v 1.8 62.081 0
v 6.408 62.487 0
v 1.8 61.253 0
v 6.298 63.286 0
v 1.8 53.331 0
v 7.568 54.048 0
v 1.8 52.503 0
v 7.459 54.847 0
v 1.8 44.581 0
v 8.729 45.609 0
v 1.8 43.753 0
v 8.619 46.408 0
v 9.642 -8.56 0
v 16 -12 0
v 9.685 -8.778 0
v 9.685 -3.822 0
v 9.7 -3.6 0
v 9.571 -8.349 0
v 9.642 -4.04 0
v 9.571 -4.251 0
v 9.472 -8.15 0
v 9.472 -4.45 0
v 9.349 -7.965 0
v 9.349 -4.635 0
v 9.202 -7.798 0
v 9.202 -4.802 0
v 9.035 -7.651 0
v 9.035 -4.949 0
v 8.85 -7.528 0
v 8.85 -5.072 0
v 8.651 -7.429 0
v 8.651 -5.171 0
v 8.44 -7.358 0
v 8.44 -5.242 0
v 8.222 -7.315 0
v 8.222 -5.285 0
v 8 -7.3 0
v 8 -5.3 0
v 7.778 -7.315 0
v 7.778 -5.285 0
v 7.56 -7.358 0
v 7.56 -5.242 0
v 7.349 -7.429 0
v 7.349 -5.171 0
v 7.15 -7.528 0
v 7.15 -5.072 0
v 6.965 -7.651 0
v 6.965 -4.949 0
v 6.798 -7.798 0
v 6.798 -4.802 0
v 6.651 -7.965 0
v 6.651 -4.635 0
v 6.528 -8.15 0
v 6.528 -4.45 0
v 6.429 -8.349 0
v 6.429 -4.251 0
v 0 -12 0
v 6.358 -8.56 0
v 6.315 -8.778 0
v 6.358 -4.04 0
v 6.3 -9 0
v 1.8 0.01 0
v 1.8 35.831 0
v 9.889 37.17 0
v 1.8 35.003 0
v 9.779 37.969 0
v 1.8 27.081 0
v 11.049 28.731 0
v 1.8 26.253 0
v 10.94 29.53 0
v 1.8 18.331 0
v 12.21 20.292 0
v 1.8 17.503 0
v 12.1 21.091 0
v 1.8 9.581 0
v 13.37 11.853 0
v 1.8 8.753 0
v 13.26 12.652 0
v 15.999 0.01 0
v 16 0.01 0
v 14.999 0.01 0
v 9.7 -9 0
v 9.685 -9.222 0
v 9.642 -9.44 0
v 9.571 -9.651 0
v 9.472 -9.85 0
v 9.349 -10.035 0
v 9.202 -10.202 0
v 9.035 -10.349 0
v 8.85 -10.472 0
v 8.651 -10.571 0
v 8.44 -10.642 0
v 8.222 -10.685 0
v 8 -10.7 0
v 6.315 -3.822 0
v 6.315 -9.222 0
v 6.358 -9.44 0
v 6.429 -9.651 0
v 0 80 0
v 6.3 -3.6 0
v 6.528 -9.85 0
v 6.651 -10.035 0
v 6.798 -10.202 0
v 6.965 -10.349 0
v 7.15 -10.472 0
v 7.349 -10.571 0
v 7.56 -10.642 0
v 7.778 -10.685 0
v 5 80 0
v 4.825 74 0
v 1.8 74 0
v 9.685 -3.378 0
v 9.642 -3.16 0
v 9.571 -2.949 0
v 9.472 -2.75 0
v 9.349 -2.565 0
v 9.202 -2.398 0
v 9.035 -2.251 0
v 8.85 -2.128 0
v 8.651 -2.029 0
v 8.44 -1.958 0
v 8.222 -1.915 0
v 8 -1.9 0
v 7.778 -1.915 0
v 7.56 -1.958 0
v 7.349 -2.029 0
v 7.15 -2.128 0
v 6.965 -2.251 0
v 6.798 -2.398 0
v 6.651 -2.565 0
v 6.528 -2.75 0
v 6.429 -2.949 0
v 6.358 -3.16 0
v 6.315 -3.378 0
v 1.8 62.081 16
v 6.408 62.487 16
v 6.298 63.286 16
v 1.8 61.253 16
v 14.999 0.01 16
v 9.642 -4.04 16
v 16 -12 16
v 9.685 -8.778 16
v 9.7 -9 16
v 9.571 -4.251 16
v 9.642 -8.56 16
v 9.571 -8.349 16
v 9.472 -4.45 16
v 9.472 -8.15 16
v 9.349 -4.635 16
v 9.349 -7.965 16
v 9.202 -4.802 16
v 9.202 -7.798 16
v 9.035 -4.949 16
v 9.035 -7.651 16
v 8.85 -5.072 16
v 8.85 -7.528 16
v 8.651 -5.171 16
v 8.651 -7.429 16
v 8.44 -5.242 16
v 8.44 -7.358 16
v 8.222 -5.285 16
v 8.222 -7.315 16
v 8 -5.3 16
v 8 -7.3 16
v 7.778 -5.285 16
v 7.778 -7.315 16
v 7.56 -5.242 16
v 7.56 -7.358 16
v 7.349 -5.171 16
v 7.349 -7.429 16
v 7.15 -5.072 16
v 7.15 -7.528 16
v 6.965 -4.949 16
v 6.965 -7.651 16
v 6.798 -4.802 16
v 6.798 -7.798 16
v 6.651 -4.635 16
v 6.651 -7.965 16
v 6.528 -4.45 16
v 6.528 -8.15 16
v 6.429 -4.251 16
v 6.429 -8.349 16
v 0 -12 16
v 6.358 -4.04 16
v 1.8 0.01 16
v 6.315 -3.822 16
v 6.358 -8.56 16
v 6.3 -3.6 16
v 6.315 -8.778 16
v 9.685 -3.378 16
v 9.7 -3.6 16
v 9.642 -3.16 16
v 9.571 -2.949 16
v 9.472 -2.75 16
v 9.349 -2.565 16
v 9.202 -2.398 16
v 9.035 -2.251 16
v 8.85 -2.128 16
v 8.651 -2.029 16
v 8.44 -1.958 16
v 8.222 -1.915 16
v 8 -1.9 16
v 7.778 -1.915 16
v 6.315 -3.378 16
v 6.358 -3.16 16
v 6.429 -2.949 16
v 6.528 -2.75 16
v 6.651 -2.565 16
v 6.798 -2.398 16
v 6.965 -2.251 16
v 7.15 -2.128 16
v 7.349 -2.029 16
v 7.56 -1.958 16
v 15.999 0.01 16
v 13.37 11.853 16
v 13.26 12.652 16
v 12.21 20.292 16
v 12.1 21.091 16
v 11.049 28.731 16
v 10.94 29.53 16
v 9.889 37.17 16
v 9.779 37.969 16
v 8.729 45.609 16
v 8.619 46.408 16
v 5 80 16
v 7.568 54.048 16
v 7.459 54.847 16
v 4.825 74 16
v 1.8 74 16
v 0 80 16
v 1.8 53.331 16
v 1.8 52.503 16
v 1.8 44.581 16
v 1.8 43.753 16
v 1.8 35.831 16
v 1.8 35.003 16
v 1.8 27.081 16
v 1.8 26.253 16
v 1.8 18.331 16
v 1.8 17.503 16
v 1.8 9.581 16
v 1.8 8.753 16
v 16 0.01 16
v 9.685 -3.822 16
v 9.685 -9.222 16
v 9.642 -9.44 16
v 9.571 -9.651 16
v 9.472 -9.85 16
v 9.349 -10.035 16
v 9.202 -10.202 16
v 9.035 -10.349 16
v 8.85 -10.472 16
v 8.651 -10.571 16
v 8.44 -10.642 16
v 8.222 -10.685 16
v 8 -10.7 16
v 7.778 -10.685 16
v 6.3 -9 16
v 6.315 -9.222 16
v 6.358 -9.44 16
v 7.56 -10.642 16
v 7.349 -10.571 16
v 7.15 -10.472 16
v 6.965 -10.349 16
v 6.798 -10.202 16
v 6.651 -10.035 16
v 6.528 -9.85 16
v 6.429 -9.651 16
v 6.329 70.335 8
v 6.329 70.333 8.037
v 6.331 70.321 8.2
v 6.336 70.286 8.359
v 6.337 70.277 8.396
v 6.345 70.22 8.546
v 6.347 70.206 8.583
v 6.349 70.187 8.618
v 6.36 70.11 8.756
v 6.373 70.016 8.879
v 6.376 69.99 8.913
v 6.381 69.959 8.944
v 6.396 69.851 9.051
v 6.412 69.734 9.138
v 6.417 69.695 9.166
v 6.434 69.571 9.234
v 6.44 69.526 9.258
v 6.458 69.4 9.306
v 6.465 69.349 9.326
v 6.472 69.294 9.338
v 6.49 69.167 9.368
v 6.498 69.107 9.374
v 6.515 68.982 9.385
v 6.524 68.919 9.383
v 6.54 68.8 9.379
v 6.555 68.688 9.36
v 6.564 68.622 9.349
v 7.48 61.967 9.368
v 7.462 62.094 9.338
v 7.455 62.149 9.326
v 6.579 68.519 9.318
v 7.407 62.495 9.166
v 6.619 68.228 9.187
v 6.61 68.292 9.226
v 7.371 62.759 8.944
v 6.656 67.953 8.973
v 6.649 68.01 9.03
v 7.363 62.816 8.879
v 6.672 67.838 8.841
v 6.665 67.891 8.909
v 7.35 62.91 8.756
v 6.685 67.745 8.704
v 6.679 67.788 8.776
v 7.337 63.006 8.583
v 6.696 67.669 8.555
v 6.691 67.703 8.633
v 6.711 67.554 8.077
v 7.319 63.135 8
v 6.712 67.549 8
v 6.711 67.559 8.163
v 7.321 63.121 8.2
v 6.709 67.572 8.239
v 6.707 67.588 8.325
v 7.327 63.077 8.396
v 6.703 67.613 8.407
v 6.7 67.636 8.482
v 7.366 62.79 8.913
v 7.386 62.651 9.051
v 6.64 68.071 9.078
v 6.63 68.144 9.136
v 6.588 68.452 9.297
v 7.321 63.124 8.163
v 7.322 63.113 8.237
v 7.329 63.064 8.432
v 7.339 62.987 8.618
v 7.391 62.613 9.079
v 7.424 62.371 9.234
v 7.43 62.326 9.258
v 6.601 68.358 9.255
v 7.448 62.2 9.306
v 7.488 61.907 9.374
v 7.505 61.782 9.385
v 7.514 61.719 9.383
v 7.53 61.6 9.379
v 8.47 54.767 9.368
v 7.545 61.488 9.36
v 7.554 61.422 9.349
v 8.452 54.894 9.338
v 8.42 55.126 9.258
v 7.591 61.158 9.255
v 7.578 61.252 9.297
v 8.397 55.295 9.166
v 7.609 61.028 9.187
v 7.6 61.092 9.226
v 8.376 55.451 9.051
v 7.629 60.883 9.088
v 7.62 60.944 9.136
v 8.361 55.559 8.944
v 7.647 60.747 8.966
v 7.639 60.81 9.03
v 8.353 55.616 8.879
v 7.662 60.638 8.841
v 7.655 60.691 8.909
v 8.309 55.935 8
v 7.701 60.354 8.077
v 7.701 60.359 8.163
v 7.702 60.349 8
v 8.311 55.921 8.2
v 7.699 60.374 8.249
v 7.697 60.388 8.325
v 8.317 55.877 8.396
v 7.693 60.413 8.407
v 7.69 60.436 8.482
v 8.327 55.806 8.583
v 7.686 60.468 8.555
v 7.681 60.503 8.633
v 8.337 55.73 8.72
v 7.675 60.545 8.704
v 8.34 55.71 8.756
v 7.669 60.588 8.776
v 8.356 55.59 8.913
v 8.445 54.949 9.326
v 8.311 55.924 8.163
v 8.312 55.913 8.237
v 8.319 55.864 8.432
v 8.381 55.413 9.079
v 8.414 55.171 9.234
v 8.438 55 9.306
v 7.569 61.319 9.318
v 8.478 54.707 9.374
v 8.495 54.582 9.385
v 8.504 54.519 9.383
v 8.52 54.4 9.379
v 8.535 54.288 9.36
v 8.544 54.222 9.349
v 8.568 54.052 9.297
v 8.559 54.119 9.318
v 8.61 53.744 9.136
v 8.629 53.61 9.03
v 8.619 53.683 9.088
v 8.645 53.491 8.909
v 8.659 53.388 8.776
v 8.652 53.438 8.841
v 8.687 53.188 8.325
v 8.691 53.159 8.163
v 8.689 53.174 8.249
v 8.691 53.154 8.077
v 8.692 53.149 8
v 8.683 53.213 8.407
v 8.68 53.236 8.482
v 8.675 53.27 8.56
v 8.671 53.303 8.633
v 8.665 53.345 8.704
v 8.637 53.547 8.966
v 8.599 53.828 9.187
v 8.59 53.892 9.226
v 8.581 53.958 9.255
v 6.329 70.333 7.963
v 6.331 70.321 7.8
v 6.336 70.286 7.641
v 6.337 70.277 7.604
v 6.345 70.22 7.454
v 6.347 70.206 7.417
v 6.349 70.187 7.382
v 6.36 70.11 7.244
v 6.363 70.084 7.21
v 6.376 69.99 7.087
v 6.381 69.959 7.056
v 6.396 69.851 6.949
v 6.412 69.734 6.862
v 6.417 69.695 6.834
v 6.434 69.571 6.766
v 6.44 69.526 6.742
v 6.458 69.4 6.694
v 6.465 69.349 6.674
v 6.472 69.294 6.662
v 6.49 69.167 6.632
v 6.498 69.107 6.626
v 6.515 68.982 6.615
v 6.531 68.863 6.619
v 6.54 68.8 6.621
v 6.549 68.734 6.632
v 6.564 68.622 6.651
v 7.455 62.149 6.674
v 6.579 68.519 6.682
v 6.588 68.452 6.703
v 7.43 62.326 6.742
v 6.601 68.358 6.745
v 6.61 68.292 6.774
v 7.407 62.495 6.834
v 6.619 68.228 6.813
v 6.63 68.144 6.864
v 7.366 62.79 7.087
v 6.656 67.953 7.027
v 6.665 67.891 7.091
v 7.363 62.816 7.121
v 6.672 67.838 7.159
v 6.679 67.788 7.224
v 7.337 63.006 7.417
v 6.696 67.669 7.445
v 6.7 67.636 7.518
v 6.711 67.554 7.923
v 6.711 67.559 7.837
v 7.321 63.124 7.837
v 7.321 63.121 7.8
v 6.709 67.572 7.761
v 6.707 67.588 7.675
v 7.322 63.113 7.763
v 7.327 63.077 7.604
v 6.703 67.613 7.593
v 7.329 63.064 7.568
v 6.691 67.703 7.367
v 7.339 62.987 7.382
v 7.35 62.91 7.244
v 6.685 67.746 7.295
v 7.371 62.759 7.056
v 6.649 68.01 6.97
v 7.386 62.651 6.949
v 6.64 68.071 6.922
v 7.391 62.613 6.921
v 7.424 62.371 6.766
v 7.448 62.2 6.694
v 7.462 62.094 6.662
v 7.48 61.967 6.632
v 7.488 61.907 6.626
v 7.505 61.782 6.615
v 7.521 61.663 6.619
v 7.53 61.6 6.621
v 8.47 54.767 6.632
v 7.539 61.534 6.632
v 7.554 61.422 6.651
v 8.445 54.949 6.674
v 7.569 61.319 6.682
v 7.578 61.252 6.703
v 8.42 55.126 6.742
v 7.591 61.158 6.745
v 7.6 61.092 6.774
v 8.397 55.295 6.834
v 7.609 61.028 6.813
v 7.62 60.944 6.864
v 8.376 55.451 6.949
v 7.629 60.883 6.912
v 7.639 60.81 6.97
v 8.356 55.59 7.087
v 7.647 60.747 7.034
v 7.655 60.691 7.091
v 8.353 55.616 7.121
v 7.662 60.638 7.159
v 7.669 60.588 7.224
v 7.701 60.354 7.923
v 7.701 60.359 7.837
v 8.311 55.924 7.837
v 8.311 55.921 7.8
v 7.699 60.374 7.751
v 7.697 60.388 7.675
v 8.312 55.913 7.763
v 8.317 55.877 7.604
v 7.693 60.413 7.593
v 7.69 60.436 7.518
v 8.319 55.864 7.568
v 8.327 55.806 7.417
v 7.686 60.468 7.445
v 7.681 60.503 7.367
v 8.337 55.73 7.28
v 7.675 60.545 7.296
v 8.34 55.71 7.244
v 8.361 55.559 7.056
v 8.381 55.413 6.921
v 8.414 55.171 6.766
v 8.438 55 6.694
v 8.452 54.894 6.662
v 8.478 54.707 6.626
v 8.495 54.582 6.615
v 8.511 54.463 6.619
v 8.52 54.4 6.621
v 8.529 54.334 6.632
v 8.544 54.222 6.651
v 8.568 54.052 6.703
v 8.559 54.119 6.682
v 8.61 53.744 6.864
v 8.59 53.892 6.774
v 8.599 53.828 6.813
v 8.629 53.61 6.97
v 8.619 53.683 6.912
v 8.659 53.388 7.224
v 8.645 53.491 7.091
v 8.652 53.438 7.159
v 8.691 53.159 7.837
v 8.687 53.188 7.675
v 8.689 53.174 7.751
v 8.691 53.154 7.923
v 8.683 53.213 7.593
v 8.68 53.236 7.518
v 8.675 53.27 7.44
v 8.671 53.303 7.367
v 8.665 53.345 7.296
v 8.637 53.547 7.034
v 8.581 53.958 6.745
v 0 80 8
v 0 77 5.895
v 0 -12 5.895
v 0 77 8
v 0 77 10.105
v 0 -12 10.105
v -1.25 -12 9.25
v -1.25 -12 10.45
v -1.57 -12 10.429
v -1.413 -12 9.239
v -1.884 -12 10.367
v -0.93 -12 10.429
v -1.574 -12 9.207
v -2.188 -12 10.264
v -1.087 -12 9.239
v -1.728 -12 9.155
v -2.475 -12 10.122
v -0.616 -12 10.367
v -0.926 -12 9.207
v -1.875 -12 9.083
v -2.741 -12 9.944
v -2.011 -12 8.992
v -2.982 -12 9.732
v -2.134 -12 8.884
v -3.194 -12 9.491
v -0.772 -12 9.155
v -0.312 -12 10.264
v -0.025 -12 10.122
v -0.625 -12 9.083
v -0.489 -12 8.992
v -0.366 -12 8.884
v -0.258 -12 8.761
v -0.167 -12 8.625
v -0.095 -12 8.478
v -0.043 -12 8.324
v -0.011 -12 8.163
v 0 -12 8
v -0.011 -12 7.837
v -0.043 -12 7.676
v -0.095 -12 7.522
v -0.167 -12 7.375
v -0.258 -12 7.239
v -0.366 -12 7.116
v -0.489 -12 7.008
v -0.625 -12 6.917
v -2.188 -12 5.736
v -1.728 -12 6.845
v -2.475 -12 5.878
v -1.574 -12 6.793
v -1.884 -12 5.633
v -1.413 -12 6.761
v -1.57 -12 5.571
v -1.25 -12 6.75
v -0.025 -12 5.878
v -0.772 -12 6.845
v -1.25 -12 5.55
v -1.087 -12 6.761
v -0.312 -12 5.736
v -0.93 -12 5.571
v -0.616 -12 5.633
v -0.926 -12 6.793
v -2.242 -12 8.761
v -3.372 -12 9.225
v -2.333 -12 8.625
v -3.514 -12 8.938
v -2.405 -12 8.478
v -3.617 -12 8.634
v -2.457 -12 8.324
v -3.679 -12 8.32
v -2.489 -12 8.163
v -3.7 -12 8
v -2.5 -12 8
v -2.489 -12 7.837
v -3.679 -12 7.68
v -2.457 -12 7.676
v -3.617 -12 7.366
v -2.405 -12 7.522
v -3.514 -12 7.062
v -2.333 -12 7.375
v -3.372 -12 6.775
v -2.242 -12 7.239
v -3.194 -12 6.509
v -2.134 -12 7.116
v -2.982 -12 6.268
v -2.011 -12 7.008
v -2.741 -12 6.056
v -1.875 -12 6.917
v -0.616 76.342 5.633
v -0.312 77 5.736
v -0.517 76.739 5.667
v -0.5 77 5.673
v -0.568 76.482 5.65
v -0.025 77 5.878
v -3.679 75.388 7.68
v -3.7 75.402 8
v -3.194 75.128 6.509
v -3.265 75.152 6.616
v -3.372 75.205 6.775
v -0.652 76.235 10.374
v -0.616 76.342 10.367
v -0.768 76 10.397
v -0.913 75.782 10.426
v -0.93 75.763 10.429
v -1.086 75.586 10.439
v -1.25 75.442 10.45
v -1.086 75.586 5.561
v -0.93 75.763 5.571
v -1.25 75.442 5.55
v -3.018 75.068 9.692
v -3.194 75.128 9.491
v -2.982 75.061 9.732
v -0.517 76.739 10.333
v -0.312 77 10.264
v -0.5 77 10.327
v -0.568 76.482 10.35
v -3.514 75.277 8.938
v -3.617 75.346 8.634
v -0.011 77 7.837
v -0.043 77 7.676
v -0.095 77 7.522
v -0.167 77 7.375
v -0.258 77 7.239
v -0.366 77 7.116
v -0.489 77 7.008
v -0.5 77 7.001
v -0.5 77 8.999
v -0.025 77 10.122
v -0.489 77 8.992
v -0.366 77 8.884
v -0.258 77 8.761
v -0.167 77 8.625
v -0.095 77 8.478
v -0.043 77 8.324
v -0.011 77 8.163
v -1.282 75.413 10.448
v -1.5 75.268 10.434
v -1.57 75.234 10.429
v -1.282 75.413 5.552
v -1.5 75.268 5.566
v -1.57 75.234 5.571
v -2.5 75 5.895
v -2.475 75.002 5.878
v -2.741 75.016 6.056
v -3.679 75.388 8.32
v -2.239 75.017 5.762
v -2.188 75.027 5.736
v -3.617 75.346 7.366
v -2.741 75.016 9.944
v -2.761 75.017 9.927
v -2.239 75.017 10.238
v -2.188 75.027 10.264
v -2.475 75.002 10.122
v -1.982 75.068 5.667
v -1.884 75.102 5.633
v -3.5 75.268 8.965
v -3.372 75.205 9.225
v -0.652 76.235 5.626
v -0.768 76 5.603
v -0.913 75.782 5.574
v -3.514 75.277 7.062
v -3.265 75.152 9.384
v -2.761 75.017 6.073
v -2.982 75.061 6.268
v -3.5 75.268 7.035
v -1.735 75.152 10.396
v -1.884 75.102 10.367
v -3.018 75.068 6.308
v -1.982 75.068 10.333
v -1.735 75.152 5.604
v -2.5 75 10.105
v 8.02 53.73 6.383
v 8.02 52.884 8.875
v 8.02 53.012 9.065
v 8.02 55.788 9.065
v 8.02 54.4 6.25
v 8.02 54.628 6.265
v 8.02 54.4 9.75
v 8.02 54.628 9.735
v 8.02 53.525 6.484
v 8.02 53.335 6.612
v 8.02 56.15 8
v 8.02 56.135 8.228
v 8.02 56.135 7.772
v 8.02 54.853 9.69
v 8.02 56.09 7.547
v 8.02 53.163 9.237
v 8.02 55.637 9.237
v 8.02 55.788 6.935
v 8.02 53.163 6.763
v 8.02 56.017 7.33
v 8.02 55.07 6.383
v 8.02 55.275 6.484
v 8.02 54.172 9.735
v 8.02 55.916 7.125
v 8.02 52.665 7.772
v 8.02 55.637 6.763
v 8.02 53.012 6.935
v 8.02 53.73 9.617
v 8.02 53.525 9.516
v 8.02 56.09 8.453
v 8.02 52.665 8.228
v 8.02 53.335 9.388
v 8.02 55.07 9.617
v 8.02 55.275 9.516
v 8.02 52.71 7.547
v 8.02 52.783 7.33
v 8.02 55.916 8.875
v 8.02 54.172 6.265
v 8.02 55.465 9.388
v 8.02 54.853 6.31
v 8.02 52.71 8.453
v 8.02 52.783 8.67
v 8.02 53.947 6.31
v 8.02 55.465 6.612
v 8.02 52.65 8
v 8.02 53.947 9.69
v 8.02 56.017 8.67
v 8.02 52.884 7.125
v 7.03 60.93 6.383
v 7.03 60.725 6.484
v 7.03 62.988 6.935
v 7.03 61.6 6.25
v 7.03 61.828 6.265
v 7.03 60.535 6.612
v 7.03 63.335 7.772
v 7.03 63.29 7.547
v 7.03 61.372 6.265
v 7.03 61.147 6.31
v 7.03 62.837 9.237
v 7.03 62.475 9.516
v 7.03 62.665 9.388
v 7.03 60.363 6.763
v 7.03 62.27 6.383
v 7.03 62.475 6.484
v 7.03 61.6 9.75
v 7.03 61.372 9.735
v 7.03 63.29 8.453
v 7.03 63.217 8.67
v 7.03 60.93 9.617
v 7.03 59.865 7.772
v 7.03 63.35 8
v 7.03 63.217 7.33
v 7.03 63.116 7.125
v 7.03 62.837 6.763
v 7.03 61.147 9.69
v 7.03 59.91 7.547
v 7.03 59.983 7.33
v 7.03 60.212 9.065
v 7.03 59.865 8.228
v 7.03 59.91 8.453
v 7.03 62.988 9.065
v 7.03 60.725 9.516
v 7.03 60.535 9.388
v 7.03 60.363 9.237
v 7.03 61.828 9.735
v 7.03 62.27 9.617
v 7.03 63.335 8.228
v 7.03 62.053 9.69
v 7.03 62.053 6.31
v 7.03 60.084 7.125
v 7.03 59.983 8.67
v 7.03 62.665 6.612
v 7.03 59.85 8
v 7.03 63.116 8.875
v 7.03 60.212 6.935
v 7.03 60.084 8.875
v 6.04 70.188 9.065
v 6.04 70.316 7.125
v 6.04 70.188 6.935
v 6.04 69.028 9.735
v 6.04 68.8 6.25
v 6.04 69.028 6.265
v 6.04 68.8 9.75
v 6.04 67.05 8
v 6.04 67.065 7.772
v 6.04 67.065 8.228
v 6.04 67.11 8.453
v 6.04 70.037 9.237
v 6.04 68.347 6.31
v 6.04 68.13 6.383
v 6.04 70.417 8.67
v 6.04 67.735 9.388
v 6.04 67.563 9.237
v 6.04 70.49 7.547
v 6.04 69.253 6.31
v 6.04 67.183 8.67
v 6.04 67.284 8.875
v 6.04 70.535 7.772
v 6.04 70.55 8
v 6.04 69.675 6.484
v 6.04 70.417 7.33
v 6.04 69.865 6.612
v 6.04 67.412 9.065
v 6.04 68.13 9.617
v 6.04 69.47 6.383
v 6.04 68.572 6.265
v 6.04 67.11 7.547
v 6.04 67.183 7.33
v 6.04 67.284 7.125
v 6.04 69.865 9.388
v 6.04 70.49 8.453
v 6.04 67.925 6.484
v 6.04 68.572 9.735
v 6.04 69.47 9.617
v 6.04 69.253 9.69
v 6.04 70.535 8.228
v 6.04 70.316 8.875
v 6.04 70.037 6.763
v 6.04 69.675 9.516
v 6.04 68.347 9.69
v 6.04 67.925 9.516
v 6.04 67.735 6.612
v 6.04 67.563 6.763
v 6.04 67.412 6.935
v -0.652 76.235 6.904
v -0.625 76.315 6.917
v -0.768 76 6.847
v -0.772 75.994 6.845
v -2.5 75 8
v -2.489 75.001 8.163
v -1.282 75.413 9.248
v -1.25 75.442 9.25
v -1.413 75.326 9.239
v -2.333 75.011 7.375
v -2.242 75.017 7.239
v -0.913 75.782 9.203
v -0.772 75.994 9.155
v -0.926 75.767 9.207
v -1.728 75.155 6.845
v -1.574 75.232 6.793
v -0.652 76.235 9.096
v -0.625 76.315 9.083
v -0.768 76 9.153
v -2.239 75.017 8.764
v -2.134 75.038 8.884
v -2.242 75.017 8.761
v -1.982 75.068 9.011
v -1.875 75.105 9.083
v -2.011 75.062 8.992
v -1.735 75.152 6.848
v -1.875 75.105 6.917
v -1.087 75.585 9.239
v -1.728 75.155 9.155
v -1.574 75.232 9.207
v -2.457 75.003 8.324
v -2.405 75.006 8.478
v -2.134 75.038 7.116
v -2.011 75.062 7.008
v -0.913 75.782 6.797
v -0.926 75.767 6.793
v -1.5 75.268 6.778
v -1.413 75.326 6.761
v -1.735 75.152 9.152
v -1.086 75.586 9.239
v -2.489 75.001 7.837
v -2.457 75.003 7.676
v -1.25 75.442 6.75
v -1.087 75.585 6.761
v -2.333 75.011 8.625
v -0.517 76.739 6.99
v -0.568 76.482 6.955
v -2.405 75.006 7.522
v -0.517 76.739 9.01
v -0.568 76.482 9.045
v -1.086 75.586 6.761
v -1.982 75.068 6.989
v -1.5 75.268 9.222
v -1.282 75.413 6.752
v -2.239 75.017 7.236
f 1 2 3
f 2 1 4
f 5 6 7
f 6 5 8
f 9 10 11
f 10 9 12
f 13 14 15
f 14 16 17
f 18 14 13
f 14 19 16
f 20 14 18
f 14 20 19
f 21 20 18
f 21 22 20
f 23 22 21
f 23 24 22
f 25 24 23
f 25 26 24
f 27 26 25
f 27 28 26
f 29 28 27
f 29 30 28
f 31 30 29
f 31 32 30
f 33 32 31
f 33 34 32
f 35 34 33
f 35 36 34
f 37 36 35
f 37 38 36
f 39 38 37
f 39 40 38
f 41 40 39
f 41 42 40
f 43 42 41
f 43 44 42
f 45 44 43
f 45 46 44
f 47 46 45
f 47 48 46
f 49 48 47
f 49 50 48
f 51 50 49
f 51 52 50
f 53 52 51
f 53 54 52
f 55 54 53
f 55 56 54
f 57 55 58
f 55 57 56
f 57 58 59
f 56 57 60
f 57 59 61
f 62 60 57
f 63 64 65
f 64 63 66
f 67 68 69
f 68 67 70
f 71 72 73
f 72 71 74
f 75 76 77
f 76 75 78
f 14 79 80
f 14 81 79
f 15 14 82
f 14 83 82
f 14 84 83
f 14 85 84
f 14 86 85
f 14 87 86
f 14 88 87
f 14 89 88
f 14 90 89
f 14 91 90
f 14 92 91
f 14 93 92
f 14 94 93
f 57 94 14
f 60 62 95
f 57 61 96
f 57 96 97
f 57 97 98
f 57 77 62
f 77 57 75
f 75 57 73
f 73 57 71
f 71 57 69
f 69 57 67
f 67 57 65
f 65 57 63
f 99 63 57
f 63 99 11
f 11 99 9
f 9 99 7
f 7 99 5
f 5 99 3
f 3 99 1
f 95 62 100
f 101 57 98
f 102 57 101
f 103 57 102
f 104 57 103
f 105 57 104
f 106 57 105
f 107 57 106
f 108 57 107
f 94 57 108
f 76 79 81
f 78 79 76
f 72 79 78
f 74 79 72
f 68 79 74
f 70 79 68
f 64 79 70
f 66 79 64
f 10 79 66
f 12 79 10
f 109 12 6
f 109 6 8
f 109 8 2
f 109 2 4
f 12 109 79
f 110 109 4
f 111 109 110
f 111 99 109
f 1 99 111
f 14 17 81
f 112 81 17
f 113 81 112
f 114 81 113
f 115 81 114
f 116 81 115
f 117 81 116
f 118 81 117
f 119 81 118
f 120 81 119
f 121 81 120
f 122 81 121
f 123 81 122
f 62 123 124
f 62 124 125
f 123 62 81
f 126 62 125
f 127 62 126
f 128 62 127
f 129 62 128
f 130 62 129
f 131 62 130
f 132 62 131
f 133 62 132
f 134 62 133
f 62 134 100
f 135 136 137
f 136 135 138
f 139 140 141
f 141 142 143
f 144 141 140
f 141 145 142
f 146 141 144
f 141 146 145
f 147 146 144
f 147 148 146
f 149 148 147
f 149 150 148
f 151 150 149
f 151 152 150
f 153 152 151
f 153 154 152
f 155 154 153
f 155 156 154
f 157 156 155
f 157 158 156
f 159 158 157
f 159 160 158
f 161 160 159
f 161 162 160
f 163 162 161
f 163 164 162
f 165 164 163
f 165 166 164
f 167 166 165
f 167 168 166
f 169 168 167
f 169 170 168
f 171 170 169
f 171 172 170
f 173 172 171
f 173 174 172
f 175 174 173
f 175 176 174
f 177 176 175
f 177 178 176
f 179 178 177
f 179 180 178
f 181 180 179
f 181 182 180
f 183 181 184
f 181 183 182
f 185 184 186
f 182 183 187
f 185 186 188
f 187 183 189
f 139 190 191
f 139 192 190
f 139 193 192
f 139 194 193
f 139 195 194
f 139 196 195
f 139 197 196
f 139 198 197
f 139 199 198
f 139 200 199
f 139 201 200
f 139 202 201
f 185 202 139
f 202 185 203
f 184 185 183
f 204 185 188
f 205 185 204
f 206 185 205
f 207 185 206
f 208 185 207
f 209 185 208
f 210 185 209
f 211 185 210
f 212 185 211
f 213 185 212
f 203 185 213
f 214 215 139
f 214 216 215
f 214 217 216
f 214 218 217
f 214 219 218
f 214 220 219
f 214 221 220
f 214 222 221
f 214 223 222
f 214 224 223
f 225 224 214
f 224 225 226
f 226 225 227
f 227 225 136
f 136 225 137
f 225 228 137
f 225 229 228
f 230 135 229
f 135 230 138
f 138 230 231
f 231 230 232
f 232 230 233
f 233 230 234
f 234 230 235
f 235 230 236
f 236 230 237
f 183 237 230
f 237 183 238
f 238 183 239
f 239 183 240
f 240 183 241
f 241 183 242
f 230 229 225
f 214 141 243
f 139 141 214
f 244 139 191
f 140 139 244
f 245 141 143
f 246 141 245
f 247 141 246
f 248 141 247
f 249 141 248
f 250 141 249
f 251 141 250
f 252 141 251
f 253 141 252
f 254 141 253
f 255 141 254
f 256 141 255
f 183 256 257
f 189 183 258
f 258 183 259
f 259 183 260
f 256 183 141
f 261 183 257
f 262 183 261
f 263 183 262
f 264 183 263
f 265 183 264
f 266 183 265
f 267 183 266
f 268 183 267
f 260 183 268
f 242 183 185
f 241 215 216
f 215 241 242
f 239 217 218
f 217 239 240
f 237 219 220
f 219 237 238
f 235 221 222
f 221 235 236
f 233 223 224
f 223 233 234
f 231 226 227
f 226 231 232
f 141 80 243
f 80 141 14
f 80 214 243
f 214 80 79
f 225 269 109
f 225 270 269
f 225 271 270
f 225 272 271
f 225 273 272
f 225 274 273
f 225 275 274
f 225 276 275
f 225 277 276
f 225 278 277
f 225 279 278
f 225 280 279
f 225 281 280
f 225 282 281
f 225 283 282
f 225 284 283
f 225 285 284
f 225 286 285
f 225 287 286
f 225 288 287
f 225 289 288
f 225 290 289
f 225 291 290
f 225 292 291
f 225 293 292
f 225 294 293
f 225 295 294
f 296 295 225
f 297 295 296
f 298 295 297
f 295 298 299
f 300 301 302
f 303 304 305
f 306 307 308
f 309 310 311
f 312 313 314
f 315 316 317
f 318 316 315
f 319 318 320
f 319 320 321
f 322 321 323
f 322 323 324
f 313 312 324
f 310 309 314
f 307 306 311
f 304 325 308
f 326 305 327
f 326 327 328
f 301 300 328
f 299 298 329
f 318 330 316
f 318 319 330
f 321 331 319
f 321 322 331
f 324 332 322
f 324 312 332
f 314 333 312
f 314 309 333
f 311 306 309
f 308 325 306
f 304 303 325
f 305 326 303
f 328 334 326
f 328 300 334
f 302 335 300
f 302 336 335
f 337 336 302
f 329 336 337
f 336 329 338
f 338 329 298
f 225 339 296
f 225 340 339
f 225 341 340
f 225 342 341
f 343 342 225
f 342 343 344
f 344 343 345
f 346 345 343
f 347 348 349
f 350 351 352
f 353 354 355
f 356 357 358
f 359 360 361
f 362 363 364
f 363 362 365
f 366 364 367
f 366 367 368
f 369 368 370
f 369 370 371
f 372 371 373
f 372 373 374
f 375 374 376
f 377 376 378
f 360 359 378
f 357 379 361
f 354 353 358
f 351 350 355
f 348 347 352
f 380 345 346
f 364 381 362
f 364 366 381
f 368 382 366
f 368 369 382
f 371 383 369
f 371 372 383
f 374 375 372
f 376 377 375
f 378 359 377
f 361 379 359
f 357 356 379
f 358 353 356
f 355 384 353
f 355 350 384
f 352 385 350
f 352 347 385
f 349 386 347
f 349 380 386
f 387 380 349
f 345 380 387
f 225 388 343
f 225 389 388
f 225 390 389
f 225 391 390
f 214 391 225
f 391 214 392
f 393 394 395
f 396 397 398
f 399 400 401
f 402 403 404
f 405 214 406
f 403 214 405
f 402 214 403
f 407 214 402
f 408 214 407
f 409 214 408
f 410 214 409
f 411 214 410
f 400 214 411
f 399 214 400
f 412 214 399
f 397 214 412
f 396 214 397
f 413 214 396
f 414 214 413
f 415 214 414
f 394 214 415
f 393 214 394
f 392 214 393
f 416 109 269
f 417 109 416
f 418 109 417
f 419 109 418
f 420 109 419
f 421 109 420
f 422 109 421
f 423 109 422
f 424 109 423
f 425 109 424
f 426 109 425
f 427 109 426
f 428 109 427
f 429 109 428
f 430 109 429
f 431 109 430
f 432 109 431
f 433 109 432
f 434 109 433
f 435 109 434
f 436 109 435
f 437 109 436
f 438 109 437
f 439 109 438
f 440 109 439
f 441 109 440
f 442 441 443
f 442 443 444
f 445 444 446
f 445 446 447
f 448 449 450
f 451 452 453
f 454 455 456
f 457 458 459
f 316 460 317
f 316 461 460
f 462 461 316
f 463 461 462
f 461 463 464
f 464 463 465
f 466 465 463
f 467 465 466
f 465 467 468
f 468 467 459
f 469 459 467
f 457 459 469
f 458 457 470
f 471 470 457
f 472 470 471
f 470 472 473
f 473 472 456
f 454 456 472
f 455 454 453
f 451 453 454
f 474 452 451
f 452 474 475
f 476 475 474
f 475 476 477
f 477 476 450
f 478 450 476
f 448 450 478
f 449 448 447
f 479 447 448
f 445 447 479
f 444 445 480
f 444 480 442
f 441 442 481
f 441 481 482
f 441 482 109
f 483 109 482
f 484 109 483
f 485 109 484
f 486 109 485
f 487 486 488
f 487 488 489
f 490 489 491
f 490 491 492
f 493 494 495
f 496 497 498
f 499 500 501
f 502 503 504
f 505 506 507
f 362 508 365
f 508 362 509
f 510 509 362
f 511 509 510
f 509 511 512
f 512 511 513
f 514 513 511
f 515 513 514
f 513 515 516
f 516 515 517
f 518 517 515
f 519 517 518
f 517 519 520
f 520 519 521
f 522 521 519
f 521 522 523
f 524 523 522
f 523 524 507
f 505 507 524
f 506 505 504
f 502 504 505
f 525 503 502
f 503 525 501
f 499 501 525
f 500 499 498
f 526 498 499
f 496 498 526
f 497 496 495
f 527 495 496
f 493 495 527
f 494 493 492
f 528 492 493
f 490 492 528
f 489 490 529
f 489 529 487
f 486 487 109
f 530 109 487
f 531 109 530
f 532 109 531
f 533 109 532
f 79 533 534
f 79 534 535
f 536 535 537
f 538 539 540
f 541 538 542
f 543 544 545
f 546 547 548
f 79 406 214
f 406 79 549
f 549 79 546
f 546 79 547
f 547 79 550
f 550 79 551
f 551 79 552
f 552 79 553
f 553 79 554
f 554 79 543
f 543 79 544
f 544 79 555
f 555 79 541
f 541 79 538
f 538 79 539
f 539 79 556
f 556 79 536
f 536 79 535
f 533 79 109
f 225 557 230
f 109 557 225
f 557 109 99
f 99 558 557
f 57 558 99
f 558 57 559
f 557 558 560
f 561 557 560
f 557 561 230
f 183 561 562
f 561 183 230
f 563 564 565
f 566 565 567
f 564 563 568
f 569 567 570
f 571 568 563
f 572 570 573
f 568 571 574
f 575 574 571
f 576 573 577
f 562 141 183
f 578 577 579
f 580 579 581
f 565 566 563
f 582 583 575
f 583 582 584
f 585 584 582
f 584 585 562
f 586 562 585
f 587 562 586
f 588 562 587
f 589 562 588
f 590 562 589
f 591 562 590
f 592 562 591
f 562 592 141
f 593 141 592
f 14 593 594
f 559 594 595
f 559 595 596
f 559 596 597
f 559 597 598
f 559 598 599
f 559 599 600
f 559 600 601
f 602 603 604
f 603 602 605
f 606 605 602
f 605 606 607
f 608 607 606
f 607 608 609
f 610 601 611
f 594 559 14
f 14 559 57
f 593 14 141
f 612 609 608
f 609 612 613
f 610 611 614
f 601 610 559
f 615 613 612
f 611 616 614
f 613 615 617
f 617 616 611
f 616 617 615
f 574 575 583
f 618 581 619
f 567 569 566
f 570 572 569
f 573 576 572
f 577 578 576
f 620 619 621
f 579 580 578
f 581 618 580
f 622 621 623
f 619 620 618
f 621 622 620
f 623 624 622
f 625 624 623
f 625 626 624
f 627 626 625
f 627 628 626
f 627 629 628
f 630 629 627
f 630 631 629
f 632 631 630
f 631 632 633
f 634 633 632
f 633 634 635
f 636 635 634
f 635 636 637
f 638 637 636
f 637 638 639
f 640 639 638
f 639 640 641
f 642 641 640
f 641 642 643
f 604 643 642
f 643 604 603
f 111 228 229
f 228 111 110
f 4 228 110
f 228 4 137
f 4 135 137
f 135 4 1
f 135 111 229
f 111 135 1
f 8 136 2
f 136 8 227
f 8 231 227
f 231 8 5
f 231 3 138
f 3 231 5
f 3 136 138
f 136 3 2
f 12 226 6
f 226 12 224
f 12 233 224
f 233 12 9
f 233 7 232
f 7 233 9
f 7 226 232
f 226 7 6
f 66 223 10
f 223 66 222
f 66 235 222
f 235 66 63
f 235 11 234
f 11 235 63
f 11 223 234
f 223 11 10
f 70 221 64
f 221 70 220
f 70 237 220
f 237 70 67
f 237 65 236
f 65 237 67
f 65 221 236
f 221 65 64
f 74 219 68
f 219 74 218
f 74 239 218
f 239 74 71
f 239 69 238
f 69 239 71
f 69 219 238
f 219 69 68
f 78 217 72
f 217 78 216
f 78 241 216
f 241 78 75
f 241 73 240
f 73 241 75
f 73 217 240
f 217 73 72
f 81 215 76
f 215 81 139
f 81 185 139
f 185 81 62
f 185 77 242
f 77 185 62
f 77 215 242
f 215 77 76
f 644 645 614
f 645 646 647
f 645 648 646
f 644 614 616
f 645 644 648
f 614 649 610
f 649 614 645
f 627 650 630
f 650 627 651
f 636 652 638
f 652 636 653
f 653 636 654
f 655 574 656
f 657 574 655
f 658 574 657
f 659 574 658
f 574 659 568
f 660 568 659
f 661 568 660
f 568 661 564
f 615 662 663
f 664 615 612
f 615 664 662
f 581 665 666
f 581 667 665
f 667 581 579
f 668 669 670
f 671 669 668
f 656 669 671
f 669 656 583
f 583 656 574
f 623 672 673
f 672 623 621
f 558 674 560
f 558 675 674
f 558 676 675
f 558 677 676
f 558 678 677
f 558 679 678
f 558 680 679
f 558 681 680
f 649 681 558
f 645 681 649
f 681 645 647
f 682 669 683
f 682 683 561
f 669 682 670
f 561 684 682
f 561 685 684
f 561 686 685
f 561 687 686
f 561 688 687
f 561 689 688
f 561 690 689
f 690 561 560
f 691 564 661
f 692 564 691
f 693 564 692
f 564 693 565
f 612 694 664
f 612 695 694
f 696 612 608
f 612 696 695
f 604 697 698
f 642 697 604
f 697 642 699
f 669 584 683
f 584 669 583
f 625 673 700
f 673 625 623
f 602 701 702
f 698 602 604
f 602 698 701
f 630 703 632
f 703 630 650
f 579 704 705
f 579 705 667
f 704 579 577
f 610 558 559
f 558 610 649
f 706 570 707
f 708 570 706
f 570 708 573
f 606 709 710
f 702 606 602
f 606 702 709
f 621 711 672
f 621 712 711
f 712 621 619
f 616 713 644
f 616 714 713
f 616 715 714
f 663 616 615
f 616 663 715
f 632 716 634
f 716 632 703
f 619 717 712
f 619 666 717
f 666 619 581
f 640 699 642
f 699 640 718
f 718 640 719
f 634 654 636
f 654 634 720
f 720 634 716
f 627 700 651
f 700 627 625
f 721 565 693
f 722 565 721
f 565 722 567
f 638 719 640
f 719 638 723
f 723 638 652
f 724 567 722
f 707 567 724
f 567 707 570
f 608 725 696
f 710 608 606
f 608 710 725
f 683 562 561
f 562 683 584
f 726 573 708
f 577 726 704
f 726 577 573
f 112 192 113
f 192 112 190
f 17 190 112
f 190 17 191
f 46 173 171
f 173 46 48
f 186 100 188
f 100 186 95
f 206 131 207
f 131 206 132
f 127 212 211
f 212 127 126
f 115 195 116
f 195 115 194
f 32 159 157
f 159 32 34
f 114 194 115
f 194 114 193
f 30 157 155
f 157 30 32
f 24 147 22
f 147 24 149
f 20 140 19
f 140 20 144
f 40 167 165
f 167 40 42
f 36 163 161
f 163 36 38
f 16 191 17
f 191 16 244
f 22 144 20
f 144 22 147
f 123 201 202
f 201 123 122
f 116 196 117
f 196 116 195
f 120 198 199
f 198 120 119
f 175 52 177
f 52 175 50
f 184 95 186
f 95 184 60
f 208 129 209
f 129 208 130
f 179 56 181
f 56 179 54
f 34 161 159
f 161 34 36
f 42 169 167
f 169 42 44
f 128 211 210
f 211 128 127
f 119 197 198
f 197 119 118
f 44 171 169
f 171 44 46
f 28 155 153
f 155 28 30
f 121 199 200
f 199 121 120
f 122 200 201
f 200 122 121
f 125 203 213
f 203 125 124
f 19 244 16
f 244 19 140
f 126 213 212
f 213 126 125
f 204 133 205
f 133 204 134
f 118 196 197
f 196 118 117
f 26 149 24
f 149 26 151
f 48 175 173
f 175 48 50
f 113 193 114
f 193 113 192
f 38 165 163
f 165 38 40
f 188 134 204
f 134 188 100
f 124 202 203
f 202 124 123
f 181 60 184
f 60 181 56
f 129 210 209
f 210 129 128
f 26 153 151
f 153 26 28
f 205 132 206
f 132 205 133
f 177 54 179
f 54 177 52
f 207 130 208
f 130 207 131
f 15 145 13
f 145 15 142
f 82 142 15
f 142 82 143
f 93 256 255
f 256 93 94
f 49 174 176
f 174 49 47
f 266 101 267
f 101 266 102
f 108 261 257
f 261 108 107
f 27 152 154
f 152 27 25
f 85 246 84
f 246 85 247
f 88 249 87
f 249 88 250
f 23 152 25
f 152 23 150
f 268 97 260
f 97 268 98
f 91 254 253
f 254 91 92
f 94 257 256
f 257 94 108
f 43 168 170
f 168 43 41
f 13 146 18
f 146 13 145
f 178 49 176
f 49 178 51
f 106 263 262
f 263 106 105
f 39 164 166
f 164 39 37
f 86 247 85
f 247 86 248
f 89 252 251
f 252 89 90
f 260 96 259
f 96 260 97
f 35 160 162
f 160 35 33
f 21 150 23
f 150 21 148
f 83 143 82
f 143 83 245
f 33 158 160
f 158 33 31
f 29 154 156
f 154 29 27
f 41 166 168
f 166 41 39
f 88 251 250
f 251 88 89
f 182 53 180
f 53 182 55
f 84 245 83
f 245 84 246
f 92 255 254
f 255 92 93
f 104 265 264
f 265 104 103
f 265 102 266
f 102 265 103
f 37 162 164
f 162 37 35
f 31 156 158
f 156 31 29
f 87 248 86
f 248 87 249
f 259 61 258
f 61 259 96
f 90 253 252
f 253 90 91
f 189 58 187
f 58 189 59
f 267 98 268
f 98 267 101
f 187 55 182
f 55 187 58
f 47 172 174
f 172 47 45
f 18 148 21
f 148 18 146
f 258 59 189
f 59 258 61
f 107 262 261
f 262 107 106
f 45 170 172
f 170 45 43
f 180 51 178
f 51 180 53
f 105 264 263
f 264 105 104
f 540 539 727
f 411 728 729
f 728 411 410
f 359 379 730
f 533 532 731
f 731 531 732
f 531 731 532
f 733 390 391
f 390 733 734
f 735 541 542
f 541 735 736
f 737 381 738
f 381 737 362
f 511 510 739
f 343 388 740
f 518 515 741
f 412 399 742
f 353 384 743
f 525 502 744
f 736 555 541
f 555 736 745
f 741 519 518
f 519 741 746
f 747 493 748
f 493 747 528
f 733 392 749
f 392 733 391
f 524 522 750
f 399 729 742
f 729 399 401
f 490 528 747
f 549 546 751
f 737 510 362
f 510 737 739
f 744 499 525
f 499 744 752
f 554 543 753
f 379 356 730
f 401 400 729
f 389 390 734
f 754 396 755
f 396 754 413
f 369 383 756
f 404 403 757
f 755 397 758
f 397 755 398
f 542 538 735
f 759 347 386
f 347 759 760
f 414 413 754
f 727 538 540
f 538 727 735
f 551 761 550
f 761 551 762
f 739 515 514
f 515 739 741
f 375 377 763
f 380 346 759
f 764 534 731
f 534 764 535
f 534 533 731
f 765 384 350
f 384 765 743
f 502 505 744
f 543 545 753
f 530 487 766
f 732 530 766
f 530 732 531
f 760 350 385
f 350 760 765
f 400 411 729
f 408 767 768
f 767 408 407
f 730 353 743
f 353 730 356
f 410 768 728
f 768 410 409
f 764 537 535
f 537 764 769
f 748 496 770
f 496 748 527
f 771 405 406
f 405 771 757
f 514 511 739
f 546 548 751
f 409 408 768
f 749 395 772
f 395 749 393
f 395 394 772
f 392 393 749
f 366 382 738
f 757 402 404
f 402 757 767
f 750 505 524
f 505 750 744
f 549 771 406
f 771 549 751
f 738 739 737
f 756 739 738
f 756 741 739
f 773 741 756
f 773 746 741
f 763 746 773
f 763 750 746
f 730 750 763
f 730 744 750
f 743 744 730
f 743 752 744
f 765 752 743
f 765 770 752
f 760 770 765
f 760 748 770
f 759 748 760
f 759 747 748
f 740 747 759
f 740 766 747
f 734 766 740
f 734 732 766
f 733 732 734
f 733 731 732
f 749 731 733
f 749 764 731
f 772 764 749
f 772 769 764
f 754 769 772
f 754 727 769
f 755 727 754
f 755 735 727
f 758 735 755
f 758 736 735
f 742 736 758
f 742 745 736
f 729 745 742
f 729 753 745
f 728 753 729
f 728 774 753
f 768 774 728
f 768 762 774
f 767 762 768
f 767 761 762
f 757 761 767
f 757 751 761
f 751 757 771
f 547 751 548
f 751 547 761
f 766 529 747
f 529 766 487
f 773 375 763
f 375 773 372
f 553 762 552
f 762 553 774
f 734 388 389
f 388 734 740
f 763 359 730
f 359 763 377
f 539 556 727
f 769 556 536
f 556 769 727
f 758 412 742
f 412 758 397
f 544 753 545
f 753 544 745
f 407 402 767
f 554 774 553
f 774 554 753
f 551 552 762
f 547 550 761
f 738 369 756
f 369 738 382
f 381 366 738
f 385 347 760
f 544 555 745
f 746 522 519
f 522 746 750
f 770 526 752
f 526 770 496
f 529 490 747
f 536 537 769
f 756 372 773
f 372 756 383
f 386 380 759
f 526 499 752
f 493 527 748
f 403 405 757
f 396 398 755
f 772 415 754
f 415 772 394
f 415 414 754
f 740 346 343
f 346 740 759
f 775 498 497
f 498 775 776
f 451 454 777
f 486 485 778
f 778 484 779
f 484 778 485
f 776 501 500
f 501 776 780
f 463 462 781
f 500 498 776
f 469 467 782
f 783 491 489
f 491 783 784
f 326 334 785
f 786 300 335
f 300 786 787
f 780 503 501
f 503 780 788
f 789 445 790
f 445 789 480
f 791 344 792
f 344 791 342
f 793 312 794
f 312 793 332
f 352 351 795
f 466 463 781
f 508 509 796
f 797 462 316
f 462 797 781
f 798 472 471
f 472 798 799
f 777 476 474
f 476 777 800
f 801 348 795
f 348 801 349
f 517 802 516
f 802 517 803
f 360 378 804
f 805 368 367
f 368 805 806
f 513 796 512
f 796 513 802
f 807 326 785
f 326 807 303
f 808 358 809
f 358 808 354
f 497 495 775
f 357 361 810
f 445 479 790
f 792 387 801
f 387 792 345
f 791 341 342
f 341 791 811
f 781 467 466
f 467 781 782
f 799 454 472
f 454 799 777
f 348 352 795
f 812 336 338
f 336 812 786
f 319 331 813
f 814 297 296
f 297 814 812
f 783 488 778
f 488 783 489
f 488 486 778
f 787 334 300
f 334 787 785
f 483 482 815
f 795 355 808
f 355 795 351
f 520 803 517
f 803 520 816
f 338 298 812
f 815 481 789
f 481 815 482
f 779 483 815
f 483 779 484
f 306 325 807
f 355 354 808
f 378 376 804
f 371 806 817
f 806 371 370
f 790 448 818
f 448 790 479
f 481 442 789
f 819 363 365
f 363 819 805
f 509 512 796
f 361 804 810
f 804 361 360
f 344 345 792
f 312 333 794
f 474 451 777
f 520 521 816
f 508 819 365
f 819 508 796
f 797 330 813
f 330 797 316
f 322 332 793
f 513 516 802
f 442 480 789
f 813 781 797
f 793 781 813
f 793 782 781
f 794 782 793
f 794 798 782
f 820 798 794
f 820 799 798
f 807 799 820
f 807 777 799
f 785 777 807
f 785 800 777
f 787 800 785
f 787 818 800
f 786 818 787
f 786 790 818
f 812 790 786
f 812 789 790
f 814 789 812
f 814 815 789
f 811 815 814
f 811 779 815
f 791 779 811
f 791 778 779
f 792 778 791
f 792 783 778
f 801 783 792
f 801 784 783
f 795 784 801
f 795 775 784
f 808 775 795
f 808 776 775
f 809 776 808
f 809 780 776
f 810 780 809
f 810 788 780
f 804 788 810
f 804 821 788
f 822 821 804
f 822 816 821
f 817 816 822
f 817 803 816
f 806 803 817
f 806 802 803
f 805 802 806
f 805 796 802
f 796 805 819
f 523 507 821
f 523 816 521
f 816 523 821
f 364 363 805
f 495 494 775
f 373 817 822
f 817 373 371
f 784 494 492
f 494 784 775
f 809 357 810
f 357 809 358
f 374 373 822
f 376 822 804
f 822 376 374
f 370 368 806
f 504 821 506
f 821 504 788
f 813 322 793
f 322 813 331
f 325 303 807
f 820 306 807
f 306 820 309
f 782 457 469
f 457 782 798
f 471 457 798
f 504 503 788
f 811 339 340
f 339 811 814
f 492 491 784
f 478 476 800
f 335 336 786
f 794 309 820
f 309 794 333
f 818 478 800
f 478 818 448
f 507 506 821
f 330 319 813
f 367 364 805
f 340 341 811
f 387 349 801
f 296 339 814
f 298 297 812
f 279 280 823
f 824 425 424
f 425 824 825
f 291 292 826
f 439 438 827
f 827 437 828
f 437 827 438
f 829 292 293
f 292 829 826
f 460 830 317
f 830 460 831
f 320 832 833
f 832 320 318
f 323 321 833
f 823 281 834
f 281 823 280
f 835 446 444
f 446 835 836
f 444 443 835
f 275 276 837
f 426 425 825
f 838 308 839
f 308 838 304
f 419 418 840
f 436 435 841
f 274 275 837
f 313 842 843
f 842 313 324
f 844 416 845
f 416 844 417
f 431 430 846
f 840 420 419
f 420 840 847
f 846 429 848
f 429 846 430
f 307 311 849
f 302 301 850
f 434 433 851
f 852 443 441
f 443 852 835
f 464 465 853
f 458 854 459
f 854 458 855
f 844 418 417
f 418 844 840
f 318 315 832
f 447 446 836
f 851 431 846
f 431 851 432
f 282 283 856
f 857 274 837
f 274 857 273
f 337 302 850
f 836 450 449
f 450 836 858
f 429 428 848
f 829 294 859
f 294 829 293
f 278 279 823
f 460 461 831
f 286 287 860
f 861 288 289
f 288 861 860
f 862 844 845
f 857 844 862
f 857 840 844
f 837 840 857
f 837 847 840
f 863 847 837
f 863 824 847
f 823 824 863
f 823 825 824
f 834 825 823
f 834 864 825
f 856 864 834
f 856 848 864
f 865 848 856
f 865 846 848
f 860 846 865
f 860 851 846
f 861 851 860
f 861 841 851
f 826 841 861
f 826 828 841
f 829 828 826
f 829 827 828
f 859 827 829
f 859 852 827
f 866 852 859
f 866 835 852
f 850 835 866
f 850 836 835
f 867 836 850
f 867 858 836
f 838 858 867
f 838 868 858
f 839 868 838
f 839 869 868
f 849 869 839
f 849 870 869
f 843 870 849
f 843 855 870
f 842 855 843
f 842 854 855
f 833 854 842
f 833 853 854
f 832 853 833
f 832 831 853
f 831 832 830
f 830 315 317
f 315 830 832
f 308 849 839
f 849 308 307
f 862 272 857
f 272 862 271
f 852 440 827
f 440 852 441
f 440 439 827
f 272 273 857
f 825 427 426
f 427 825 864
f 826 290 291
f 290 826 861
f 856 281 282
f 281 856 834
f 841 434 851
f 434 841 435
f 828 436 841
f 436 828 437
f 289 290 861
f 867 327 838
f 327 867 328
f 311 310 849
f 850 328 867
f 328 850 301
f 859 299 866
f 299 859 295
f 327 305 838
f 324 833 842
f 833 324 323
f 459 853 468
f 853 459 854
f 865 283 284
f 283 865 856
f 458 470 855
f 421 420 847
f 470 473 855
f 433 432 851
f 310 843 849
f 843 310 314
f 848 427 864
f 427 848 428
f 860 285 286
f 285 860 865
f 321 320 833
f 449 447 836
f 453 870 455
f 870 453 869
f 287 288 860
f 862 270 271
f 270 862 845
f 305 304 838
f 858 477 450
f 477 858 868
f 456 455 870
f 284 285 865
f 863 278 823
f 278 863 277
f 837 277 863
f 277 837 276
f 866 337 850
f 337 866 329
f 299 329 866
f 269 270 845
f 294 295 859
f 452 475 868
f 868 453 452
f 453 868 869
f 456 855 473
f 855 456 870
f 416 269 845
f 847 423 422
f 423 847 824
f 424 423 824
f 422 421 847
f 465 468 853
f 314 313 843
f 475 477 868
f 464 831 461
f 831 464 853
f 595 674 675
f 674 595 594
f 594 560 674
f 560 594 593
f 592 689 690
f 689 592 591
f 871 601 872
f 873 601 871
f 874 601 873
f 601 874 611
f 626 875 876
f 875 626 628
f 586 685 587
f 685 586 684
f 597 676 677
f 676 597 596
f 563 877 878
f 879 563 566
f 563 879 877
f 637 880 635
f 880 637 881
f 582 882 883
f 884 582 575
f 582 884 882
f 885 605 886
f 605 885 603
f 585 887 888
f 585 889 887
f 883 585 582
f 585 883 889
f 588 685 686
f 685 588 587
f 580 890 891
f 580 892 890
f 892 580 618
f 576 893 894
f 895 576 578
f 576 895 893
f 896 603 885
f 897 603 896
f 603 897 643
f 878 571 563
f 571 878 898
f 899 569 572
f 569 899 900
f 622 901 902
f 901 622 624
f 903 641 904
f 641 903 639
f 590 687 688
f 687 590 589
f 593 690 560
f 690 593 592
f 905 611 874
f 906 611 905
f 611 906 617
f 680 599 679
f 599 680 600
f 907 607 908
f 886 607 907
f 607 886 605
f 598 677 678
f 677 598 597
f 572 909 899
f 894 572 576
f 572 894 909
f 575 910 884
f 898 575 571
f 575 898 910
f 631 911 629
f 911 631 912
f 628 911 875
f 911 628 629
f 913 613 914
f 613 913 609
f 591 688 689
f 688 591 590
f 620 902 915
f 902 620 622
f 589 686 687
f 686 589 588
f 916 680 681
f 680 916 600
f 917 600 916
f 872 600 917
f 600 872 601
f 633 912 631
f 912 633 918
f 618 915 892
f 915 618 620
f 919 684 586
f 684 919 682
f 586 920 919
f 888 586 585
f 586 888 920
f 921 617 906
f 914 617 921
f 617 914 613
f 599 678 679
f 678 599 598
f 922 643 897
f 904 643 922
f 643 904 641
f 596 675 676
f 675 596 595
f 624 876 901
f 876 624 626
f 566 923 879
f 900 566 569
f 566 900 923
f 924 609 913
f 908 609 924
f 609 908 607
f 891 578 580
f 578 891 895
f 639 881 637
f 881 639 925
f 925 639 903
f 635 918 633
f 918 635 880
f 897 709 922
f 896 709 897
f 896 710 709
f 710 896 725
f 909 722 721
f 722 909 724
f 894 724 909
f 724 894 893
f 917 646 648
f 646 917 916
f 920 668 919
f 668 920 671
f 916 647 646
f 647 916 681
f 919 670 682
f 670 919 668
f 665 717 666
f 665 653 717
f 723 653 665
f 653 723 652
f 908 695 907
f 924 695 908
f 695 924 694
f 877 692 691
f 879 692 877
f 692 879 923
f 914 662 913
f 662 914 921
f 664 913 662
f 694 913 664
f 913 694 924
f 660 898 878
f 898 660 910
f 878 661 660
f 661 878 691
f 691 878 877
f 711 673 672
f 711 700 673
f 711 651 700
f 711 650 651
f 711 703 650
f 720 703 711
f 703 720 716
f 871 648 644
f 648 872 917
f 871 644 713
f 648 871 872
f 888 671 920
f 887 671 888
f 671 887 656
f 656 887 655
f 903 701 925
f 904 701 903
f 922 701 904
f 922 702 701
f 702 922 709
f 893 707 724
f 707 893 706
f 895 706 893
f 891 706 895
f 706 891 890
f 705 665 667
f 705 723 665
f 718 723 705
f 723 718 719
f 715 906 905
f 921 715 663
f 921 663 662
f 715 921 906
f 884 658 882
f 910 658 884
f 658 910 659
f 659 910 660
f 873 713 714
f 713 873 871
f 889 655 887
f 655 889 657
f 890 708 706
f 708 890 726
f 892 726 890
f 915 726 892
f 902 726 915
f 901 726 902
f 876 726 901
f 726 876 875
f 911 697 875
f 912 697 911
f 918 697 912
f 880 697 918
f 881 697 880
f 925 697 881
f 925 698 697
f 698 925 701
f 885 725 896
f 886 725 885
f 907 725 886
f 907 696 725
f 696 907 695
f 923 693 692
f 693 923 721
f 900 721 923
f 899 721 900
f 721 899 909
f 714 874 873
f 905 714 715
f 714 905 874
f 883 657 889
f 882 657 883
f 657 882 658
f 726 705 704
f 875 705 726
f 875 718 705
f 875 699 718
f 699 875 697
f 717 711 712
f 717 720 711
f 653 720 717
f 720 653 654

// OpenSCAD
// ============================================================
// Parametric fin-ray finger for tendon-driven prosthetic hand
// See ../finray-cad-print-parameters.md for parameter guidance.
//
// Coordinate system (side profile in XY, extruded along Z):
//   X = depth (back wall at x=0, front/contact wall converging)
//   Y = length (base at y=0, tip at y=finger_length)
//   Z = finger width
//
// PRINT ORIENTATION: lying on its side face (as modeled) — walls
// and ribs are continuous XY extrusion paths; bending stress runs
// along layer lines. TPU 95A, 2 perimeters, 0-10% infill.
// ============================================================

/* [Finger size] */
finger_length = 80;      // base->tip. index/middle/ring/pinky ~ 80/88/82/65
base_depth    = 16;      // wall-to-wall at the base
tip_depth     = 5;       // wall-to-wall at the tip
finger_width  = 16;      // extrusion width (Z)

/* [Walls] */
front_wall_t      = 1.0; // dominant compliance knob (0.8 soft .. 1.6 firm)
front_wall_t_tip  = 1.0; // set < front_wall_t for a graded ("biological") wall
back_wall_t       = 1.8; // keep >= 1.5x front wall

/* [Ribs] */
rib_count    = 7;
rib_t        = 0.8;
rib_tilt     = 15;       // deg toward tip; 0 = perpendicular to back wall
floating_gap = 0;        // 0.4 => "floating ribs" (soft first contact, then stiffen)

/* [Tendon] */
tendon_channel_d = 2.5;  // fits 2mm-OD PTFE liner
tendon_anchor_d  = 4;    // cross-hole near tip, figure-8 stopper knot behind it

/* [Base mount] */
base_height   = 12;      // mounting block below y=0
mount_hole_d  = 3.4;     // M3 clearance, two cross-holes
tip_solid_len = 6;       // solid tip cap

$fn = 48;
EPS = 0.01;

// ---- derived ----
// front wall outer x at height y (linear taper base->tip)
function fw_outer(y) = base_depth - (base_depth - tip_depth) * y / finger_length;
// graded front wall thickness at height y
function fw_t(y) = front_wall_t - (front_wall_t - front_wall_t_tip) * y / finger_length;
function fw_inner(y) = fw_outer(y) - fw_t(y);

// ------------------------------------------------------------
// 2D profile pieces
// ------------------------------------------------------------
N = 24; // taper segmentation

module envelope_2d() { // full outer boundary of the profile
    polygon(concat(
        [[0, 0]],
        [for (i = [0:N]) [fw_outer(i * finger_length / N), i * finger_length / N]],
        [[0, finger_length]]
    ));
}

module cavity_2d() { // interior air: inside walls, minus floating gap strip
    polygon(concat(
        [[back_wall_t, 0]],
        [for (i = [0:N]) let (y = i * finger_length / N)
            [max(back_wall_t + EPS, fw_inner(y) - floating_gap), y]],
        [[back_wall_t, finger_length]]
    ));
}

module ribs_2d() { // overlong tilted ribs, trimmed against the cavity
    intersection() {
        cavity_2d();
        for (i = [1:rib_count]) {
            y = i * (finger_length - tip_solid_len - 4) / (rib_count + 1);
            translate([back_wall_t - EPS, y])
                rotate(rib_tilt)
                    square([base_depth * 1.5, rib_t]);
        }
    }
}

module profile_2d() {
    union() {
        difference() { // walls + solid tip
            envelope_2d();
            // subtract cavity everywhere except the solid tip cap
            intersection() {
                cavity_2d();
                translate([-EPS, -EPS])
                    square([base_depth + 2 * EPS,
                            finger_length - tip_solid_len + EPS]);
            }
        }
        ribs_2d();
        // base mounting block
        translate([0, -base_height]) square([base_depth, base_height + EPS]);
    }
}

// ------------------------------------------------------------
// 3D finger
// ------------------------------------------------------------
module finray_finger() {
    difference() {
        union() {
            linear_extrude(finger_width) profile_2d();
            // thickened ridge on the back wall to house the tendon channel
            translate([-tendon_channel_d / 2, -base_height, finger_width / 2])
                rotate([-90, 0, 0])
                    cylinder(d = tendon_channel_d + 2 * 1.2,
                             h = finger_length - tip_solid_len / 2 + base_height);
        }
        // tendon channel bore (along the back wall, full length)
        translate([-tendon_channel_d / 2, -base_height - EPS, finger_width / 2])
            rotate([-90, 0, 0])
                cylinder(d = tendon_channel_d,
                         h = finger_length + base_height + 2 * EPS);
        // tendon anchor cross-hole in the solid tip
        translate([-tendon_channel_d, finger_length - tip_solid_len / 2, -EPS])
            cylinder(d = tendon_anchor_d, h = finger_width + 2 * EPS);
        // M3 mounting cross-holes in the base block
        for (y = [-base_height * 0.3, -base_height * 0.75])
            translate([base_depth / 2, y, -EPS])
                cylinder(d = mount_hole_d, h = finger_width + 2 * EPS);
        // silicone-pad dovetail keys on the distal third of the contact wall
        for (i = [0:2]) {
            y = finger_length * (0.68 + i * 0.09);
            translate([fw_inner(y) + fw_t(y) / 2, y, finger_width / 2])
                rotate([0, 90, 0])
                    cylinder(d1 = 3.5, d2 = 2, h = fw_t(y) + EPS, center = false);
        }
    }
}

// ------------------------------------------------------------
// Optional: open-face drape mold for the silicone fingertip pad.
// Print in PLA, pour Ecoflex 00-30 ~3.5mm deep, press finger tip in.
// ------------------------------------------------------------
module fingertip_pad_mold(pad_t = 3.5) {
    pad_len = finger_length * 0.33;
    difference() {
        cube([base_depth + 10, pad_len + 10, finger_width * 0.8]);
        translate([5 + pad_t, 5 - (finger_length - pad_len), finger_width * 0.8
                   - finger_width + 2])
            finray_finger();
    }
}

// ---- render selection ----
part = "finger"; // "finger" | "mold"
if (part == "finger") finray_finger();
else fingertip_pad_mold();
